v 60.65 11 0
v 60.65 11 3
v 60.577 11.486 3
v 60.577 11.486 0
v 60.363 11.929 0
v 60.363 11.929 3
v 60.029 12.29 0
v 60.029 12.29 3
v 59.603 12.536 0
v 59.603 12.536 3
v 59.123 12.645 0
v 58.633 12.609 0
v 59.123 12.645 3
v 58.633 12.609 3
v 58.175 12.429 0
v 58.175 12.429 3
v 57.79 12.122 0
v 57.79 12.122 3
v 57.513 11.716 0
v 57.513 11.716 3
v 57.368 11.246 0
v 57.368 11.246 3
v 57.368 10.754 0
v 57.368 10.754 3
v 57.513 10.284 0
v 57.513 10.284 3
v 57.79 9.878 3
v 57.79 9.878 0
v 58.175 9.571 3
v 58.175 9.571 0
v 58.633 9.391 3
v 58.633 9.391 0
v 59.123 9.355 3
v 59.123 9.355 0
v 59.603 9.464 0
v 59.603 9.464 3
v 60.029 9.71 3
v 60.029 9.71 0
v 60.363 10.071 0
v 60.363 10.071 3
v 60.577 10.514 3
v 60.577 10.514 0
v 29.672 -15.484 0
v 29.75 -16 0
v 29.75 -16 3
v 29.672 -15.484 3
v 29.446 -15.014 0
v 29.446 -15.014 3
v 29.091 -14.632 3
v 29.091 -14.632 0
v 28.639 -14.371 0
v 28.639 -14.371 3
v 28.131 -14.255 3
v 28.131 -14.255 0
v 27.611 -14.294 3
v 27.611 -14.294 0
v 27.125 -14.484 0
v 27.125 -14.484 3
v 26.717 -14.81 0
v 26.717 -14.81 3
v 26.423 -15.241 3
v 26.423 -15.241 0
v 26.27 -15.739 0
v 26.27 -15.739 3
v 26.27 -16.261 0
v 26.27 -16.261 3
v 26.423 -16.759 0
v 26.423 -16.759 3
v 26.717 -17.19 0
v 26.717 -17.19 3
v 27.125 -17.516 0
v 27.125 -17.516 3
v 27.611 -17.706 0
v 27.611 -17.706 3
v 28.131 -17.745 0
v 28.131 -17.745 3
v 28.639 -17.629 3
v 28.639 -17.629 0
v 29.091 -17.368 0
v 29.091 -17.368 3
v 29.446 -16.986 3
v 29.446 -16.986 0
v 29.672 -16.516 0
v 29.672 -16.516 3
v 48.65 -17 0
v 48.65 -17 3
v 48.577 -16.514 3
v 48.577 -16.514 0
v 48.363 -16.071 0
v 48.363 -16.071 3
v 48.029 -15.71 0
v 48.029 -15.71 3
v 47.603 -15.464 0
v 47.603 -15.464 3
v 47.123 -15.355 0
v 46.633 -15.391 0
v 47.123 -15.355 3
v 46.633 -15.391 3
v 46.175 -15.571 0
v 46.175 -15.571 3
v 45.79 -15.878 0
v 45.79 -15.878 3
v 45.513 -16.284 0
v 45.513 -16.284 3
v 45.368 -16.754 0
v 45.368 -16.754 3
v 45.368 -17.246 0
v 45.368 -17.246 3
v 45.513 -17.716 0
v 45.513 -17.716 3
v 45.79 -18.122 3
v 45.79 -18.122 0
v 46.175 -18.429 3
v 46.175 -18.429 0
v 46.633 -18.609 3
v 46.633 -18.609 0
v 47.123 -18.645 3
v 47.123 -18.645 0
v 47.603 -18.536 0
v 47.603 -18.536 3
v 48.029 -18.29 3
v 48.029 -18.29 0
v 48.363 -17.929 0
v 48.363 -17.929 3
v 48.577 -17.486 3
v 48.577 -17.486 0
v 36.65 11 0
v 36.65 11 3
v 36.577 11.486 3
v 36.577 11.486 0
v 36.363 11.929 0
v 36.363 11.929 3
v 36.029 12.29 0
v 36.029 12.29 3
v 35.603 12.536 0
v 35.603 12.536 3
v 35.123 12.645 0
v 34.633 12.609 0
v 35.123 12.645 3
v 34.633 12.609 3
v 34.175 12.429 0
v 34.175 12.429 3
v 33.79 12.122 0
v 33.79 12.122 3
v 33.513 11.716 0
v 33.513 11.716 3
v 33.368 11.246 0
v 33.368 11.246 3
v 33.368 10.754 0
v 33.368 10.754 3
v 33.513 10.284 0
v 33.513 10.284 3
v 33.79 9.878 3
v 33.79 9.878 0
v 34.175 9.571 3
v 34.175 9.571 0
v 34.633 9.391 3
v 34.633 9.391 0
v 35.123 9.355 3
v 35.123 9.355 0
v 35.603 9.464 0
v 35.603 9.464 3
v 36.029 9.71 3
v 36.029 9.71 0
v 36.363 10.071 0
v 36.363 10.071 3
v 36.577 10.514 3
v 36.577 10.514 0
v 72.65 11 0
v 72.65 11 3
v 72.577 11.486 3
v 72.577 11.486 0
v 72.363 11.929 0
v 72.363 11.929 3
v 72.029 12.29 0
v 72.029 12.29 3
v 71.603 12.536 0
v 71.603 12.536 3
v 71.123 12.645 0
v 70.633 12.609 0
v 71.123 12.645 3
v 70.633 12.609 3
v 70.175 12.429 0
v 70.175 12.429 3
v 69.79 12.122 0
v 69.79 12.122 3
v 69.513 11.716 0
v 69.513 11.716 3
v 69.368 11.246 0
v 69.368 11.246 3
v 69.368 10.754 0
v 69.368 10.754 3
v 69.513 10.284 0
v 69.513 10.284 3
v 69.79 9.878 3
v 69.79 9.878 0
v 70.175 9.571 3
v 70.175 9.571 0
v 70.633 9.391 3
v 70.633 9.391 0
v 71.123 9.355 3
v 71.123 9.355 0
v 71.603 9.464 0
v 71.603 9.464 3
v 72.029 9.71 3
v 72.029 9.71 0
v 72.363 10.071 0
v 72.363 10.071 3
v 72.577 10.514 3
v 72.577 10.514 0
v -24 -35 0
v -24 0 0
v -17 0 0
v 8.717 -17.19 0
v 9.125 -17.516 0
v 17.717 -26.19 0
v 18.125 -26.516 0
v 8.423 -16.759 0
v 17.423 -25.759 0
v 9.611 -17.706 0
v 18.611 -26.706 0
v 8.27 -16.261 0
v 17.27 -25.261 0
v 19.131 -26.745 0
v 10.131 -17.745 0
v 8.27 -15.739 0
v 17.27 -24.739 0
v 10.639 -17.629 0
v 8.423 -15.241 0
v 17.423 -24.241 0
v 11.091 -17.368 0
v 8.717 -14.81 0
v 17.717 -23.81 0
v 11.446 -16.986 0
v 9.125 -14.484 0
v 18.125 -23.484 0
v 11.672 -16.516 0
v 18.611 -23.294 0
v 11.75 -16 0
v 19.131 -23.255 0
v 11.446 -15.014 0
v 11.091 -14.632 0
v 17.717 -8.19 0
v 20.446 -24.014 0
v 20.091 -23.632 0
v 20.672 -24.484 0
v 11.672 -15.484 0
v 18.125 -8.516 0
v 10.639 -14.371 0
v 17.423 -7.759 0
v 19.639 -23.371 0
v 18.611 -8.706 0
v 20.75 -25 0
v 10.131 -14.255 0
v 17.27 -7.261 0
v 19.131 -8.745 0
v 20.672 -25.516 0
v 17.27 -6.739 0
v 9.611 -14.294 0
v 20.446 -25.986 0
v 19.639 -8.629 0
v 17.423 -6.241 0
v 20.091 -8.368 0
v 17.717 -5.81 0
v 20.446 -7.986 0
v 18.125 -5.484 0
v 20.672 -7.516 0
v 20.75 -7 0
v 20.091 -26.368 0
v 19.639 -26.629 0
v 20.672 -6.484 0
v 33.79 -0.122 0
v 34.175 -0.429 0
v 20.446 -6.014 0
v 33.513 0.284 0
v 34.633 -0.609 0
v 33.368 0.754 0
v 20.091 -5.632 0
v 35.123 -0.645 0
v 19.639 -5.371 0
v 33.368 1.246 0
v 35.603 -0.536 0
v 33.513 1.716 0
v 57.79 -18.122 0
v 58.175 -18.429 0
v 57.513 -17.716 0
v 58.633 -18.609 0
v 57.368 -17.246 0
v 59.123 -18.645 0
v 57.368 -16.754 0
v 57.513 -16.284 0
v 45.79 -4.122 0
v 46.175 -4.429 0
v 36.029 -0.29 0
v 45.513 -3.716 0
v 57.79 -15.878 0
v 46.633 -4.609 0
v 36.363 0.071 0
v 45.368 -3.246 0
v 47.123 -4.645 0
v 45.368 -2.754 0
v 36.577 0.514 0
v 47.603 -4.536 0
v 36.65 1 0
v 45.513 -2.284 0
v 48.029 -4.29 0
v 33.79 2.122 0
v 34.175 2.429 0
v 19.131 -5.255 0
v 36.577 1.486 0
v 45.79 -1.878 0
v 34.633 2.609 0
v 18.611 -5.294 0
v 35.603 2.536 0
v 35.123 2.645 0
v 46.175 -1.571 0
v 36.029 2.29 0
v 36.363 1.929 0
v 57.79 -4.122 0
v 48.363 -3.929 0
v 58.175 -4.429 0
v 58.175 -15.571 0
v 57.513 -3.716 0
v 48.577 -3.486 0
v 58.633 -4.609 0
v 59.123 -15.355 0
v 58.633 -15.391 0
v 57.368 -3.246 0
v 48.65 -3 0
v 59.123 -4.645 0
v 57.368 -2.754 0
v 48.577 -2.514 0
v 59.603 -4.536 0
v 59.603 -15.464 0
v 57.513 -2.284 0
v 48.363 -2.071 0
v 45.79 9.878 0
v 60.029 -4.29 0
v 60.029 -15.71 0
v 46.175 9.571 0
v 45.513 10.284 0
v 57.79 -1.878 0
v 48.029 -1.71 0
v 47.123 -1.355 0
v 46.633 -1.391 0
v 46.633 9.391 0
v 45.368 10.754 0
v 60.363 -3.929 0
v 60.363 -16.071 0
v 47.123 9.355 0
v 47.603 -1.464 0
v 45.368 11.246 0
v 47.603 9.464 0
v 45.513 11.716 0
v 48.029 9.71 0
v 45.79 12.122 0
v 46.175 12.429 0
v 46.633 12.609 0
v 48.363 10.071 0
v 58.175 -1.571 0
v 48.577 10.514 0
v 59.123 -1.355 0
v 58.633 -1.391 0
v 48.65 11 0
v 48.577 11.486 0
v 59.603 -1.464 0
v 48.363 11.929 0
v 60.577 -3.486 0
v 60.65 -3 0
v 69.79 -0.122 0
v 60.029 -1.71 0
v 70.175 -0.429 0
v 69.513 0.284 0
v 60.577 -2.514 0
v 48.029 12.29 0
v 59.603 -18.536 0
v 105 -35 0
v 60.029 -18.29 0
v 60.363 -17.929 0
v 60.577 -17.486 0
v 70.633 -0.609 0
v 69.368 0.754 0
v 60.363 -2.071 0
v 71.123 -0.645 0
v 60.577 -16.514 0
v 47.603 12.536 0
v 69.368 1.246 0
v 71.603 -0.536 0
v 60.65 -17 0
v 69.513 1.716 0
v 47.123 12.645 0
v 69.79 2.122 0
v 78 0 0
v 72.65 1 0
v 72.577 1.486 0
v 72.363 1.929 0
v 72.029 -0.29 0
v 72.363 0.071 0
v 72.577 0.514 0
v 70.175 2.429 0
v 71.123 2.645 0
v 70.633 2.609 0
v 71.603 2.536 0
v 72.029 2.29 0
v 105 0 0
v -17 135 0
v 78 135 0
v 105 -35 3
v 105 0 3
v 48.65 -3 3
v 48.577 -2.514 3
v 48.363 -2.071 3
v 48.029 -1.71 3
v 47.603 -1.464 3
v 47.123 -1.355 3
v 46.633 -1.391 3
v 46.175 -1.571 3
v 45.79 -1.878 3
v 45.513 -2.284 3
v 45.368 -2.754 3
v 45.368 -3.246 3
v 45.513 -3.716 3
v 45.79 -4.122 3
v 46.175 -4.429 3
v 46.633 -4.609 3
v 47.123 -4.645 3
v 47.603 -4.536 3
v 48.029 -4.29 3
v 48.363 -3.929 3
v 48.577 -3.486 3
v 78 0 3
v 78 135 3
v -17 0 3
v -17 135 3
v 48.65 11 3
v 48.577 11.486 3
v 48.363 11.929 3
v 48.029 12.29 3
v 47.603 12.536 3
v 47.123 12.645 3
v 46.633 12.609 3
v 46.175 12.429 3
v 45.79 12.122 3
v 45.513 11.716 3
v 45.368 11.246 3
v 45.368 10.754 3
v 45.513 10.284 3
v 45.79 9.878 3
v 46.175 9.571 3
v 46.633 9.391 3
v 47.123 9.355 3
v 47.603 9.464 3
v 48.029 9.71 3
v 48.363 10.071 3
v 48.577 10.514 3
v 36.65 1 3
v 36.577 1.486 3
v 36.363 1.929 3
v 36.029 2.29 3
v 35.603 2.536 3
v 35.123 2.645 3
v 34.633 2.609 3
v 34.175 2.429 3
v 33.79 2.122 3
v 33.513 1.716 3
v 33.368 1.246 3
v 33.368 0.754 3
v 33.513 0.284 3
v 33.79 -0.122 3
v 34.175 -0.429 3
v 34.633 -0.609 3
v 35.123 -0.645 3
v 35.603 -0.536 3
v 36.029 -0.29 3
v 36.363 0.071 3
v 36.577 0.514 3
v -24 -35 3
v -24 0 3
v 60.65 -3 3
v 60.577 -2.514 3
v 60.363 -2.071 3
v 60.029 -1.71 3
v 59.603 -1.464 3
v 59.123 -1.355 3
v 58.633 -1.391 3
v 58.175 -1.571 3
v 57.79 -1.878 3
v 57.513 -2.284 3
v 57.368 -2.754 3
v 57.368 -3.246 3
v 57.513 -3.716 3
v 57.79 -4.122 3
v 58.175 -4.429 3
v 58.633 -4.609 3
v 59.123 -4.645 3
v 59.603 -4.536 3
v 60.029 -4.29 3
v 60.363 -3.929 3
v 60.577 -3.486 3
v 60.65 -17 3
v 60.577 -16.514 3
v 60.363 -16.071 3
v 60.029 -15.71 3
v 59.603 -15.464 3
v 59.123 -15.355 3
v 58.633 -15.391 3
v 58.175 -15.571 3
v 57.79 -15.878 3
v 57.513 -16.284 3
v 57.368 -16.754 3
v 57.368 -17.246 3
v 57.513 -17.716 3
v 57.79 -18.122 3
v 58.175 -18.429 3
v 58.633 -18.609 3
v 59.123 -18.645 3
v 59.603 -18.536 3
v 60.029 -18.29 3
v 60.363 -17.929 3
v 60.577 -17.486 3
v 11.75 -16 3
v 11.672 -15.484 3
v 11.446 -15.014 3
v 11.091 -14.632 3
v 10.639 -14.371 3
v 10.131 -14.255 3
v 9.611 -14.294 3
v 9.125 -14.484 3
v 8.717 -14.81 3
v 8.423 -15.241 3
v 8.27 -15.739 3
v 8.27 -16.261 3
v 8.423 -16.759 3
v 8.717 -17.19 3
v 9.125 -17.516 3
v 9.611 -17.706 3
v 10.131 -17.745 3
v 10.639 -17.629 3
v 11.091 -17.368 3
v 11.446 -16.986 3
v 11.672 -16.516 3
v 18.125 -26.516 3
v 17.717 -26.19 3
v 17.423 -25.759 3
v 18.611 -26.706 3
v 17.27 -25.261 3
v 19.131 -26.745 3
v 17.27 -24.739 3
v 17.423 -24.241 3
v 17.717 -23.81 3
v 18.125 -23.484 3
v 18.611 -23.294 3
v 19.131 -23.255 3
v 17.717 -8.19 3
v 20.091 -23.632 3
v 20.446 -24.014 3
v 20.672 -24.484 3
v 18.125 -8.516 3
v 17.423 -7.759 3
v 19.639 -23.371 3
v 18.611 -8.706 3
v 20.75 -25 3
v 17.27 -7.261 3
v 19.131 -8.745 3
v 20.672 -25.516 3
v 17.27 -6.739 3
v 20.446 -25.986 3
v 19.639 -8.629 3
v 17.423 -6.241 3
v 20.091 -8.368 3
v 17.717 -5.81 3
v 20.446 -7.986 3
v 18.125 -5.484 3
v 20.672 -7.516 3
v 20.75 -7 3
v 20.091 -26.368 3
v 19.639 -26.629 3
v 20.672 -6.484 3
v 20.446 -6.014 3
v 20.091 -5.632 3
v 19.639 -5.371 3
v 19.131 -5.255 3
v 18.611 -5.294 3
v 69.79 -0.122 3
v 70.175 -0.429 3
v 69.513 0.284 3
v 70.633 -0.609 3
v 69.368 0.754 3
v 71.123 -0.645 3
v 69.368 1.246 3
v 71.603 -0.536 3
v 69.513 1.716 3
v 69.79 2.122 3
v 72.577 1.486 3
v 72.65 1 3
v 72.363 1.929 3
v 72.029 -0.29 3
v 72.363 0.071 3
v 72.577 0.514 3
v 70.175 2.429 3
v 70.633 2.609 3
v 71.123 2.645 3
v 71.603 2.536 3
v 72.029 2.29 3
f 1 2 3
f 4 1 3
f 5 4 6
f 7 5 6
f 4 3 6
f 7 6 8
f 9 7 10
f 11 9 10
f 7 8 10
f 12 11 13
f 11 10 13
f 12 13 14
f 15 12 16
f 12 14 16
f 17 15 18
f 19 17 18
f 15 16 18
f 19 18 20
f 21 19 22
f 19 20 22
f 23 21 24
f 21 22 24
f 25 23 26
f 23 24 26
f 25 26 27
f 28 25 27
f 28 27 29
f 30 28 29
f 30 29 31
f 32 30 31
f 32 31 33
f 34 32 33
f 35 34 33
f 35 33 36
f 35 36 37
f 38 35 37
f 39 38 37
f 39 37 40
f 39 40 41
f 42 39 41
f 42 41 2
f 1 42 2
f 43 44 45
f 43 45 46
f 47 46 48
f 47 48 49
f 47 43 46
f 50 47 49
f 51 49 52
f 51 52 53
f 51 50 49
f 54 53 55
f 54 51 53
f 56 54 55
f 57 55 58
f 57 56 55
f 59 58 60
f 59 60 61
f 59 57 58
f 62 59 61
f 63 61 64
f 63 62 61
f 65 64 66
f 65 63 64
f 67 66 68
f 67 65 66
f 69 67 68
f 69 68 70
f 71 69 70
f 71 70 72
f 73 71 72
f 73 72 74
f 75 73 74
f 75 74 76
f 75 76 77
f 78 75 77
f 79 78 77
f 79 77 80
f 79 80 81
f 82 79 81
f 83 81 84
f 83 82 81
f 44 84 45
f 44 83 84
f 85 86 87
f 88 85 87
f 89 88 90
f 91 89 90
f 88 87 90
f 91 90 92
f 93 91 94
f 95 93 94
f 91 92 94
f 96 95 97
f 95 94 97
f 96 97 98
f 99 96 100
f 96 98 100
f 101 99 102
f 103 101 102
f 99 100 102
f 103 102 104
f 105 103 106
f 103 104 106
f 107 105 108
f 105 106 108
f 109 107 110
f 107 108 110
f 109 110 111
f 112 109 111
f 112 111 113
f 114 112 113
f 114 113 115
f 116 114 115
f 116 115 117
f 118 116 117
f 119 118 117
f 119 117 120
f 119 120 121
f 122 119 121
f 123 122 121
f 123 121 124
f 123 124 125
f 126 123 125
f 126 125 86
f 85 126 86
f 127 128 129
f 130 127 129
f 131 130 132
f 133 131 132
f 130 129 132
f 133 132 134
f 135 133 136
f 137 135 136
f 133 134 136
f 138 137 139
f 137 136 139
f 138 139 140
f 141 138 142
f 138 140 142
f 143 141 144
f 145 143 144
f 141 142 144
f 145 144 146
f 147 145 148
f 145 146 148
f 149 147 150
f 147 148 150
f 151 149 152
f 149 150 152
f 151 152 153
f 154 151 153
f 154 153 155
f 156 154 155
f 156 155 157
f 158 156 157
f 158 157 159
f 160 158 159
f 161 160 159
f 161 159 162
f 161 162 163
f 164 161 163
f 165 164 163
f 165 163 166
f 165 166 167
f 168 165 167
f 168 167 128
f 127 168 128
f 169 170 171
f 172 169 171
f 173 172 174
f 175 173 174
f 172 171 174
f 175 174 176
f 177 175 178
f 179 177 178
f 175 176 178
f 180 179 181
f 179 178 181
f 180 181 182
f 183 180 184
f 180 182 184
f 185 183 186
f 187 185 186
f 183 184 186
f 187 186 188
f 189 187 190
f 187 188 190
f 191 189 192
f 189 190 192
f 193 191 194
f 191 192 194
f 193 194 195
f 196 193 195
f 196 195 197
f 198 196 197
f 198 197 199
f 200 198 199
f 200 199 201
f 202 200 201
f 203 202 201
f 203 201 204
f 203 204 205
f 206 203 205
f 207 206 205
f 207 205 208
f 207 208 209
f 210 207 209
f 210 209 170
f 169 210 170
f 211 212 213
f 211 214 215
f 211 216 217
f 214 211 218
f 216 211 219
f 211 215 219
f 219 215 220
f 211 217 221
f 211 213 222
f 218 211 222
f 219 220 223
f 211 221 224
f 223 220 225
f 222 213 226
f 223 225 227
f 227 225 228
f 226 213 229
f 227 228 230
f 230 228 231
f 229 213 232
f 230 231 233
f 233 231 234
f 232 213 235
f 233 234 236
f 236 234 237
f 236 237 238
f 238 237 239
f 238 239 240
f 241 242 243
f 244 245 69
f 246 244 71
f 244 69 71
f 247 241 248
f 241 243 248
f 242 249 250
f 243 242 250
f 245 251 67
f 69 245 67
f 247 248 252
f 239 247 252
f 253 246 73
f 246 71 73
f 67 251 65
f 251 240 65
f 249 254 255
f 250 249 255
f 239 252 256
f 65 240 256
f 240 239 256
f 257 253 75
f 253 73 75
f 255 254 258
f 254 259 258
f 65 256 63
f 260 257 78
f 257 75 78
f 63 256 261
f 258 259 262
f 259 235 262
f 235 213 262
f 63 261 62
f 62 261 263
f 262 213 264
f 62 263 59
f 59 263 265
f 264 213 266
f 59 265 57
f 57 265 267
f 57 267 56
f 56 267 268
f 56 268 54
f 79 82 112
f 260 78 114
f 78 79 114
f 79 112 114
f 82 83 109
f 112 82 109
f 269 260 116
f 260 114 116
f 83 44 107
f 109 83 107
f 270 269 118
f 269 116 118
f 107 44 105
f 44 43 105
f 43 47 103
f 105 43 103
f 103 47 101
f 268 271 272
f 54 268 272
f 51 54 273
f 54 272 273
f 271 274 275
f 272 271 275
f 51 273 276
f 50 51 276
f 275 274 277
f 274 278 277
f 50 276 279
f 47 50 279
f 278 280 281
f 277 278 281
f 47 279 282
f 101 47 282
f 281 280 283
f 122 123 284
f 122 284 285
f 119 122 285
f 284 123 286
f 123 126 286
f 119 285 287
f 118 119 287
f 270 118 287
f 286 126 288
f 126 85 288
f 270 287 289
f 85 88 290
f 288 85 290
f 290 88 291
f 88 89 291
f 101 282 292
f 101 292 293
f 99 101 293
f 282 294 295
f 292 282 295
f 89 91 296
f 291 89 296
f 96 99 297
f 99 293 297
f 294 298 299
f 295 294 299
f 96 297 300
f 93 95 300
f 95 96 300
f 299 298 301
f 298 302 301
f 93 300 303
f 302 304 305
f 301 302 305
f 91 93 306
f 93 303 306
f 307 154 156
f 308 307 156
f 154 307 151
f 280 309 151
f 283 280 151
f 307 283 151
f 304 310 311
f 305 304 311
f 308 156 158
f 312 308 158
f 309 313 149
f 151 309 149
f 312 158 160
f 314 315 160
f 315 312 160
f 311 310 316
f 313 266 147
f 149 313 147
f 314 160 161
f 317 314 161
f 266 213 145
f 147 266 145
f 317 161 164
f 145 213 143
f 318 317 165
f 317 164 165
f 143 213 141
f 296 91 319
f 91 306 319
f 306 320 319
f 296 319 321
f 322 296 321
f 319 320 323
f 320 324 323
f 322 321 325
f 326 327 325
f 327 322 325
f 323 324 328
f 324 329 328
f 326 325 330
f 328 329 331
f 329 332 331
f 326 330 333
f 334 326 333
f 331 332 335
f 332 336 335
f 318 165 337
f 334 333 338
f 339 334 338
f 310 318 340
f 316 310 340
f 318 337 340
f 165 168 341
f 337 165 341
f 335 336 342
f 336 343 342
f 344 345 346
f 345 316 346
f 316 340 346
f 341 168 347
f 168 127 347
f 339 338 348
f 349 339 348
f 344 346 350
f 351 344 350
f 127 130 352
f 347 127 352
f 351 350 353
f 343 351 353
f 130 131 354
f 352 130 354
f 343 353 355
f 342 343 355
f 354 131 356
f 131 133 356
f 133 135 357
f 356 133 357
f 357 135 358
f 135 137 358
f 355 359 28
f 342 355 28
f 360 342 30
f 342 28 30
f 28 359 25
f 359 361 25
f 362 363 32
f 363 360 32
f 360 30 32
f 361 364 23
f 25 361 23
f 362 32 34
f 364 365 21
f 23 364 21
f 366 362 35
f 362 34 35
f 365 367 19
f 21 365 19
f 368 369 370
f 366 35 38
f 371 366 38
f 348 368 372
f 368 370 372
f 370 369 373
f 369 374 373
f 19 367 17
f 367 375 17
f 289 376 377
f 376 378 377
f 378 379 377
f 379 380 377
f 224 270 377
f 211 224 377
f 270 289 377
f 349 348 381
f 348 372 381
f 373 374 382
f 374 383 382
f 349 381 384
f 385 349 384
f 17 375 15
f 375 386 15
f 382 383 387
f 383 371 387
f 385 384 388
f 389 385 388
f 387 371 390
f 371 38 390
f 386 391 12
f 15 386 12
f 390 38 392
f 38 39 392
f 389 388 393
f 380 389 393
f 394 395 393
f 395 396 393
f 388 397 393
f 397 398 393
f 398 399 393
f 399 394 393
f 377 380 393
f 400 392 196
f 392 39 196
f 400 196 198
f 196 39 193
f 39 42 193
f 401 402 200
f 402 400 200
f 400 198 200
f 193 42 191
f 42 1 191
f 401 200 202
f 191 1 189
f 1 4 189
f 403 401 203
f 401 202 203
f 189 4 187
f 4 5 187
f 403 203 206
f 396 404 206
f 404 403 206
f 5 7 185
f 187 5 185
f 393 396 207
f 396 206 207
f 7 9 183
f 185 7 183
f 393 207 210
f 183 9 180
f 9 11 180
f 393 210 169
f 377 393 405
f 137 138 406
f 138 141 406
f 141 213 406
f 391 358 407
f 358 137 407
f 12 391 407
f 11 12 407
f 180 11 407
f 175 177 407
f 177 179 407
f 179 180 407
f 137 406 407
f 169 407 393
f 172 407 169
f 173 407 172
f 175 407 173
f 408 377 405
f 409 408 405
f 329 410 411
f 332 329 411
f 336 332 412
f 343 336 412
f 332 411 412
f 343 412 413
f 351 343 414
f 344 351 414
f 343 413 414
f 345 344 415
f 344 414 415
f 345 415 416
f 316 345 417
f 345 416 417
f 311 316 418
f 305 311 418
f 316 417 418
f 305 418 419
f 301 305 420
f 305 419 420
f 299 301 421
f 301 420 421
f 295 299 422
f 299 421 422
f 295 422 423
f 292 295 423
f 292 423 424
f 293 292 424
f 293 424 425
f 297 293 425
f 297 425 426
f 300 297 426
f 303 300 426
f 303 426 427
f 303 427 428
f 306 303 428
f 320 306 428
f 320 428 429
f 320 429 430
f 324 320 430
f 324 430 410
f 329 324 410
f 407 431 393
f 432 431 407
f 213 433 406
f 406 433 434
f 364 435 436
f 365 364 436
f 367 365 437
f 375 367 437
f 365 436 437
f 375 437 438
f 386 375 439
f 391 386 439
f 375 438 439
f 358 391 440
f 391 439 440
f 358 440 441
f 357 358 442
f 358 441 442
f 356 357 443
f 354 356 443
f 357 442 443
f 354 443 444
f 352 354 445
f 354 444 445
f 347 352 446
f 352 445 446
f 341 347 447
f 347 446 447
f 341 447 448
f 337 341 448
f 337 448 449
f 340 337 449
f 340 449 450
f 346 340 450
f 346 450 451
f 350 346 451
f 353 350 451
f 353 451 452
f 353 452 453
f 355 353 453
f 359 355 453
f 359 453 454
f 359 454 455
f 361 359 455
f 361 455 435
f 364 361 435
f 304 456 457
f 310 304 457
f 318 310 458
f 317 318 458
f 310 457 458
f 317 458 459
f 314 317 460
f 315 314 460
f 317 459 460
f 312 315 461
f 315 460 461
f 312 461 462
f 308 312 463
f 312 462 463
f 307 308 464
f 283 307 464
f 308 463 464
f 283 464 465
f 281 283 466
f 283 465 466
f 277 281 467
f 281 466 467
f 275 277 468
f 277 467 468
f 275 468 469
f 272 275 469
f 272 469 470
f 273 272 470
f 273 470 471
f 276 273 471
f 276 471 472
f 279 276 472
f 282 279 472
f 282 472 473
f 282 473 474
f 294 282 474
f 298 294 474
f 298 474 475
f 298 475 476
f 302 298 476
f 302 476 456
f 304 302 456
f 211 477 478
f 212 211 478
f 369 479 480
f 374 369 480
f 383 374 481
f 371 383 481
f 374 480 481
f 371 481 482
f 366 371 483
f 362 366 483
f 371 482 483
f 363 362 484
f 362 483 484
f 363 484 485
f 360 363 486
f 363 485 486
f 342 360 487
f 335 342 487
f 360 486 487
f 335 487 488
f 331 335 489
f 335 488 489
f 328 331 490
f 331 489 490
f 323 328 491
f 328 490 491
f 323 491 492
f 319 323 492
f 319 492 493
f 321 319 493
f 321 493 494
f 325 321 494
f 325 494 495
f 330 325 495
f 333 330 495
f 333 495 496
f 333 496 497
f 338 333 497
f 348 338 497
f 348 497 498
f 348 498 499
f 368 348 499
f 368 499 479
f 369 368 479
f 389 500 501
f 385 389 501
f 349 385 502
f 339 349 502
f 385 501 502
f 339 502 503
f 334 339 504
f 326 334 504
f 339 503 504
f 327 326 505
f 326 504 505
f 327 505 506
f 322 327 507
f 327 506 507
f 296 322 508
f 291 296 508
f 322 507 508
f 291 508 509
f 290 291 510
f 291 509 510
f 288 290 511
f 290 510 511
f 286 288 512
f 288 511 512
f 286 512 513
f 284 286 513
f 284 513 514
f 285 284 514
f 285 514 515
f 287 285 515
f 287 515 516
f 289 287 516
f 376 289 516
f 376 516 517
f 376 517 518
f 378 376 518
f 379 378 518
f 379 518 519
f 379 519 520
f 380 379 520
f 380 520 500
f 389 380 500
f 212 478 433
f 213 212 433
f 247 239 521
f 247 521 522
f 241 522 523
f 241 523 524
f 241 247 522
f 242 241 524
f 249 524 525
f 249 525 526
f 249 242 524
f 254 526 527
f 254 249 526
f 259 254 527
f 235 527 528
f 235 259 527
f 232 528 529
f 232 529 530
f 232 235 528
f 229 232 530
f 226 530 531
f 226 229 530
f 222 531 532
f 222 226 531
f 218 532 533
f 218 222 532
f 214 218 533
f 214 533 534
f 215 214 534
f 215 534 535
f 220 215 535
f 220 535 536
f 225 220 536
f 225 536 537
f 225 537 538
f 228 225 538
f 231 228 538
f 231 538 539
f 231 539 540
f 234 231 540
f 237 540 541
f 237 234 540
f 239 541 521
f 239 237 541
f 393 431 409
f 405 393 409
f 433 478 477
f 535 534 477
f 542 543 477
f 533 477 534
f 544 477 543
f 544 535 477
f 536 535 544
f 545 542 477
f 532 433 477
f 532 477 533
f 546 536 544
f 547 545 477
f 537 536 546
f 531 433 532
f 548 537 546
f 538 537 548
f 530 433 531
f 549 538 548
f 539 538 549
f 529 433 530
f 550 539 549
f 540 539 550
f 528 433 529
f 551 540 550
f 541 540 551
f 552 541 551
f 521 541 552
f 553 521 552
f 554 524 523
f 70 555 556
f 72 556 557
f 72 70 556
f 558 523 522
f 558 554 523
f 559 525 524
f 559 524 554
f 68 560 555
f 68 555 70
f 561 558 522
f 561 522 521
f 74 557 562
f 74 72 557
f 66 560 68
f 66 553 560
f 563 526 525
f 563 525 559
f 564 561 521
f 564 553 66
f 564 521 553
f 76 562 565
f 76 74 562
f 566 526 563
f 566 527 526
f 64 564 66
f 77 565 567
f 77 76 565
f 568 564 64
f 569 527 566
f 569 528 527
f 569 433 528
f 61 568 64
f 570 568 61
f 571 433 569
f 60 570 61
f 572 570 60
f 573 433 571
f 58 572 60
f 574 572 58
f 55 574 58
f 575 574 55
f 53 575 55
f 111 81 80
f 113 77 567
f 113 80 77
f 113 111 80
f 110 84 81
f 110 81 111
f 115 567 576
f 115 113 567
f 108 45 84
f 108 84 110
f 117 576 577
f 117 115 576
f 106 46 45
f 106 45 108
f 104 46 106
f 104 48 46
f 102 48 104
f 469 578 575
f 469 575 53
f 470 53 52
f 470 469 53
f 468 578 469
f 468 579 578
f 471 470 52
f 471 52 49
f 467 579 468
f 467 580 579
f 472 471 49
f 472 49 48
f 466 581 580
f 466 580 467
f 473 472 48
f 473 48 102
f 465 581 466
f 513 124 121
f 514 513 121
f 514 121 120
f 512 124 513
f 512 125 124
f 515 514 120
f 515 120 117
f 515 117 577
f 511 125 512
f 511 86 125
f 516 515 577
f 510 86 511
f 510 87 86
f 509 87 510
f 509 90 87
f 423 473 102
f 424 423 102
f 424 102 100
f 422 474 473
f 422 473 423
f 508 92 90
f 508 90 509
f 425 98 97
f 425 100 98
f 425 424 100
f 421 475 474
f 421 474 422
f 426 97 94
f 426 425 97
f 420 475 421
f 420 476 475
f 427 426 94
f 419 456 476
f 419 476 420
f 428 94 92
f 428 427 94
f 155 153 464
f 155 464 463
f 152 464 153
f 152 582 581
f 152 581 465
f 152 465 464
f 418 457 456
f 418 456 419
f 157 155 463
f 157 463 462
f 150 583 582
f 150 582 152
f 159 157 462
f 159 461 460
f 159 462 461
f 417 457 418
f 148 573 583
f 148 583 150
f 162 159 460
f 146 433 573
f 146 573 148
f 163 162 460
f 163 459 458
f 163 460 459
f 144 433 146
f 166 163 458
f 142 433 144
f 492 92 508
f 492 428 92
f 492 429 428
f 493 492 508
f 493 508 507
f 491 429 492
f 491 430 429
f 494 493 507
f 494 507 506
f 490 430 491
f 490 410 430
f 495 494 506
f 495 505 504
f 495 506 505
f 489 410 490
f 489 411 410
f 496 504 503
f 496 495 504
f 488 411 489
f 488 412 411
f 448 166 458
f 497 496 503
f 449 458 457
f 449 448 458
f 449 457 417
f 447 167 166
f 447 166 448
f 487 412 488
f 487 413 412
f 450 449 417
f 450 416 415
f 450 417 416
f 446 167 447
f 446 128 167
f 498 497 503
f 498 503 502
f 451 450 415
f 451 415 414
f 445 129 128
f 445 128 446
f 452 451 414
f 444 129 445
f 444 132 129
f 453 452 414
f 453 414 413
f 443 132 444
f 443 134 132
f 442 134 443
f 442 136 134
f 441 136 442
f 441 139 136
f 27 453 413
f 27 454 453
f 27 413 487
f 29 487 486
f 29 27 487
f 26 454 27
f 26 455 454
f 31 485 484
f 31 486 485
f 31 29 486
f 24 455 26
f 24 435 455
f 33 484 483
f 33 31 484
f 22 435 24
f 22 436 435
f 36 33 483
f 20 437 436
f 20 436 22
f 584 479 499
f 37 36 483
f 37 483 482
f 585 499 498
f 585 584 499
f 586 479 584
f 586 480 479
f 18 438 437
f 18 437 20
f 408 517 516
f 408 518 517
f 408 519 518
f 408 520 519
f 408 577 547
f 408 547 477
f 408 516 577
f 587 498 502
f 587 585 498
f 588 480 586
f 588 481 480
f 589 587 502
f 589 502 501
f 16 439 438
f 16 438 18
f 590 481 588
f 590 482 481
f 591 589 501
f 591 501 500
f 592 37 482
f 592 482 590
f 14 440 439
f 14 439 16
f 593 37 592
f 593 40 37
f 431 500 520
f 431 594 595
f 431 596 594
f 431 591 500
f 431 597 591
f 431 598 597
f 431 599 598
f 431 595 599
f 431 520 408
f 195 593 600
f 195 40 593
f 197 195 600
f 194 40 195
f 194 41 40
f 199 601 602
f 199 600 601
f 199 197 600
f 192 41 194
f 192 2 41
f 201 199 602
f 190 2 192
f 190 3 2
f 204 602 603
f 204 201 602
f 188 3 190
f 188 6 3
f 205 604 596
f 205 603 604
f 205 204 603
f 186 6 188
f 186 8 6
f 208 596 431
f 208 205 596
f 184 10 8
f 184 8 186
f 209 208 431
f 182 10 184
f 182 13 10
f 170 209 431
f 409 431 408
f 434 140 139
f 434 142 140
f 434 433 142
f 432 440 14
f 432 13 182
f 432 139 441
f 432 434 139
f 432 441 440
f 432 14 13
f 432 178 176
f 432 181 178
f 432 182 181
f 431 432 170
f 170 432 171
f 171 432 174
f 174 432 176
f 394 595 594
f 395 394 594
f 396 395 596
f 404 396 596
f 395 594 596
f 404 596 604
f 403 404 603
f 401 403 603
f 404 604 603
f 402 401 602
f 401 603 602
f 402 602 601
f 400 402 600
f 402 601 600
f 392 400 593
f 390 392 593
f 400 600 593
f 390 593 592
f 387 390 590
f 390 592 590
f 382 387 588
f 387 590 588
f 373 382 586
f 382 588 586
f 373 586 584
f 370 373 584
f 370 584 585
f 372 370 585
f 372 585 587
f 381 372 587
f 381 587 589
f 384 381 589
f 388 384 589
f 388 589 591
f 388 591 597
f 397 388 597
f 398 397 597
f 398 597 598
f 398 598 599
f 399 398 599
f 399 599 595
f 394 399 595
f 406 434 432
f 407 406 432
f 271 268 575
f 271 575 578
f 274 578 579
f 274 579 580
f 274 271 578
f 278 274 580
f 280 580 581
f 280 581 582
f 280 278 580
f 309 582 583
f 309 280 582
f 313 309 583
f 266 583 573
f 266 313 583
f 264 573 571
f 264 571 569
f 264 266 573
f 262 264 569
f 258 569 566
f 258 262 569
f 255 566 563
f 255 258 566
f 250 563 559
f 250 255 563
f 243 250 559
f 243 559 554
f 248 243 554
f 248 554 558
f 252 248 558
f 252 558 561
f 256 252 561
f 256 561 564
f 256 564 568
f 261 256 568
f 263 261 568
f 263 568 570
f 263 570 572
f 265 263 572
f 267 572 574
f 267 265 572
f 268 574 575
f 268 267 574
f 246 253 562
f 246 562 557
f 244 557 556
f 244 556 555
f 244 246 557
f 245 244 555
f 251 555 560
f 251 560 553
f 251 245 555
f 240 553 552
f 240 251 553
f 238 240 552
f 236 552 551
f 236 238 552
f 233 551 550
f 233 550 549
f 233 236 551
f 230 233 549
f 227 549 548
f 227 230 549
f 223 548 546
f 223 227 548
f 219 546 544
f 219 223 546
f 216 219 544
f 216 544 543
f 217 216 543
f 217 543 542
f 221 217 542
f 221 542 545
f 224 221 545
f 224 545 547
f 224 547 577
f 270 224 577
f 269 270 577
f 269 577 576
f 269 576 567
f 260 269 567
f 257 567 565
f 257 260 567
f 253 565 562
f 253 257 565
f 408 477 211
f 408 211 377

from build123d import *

# Parameters (mm, degrees)
SKETCH_1_W          = 105
SKETCH_1_H          = 35
SKETCH_1_R          = 1.75
EXTRUDE_1_DEPTH     = 3
SKETCH_3_W          = 24
SKETCH_3_H          = 35
EXTRUDE_2_DEPTH     = 3
SKETCH_4_W          = 95
SKETCH_4_H          = 135
EXTRUDE_3_DEPTH     = 3
SKETCH_2_R          = 1.65
CUT_EXTRUDE_1_DEPTH = 172.052623482


with BuildPart() as part:
    # 草图1 → 凸台-拉伸1 (new body)
    with BuildSketch(Plane.XY):
        with Locations((52.5, -17.5)):
            Rectangle(SKETCH_1_W, SKETCH_1_H)
        with Locations((19, -7)):
            Circle(SKETCH_1_R, mode=Mode.SUBTRACT)
        with Locations((10, -16)):
            Circle(SKETCH_1_R, mode=Mode.SUBTRACT)
        with Locations((19, -25)):
            Circle(SKETCH_1_R, mode=Mode.SUBTRACT)
        with Locations((28, -16)):
            Circle(SKETCH_1_R, mode=Mode.SUBTRACT)
    extrude(amount=EXTRUDE_1_DEPTH)

    # 草图3 → 凸台-拉伸2 (add)
    with BuildSketch(Plane.XY.offset(3)):
        with Locations((-12, -17.5)):
            Rectangle(SKETCH_3_W, SKETCH_3_H)
    extrude(amount=-EXTRUDE_2_DEPTH)

    # 草图4 → 凸台-拉伸3 (add)
    with BuildSketch(Plane.XY.offset(3)):
        with Locations((30.5, 67.5)):
            Rectangle(SKETCH_4_W, SKETCH_4_H)
    extrude(amount=-EXTRUDE_3_DEPTH)

    # 草图2 → 切除-拉伸1 (cut, through all)
    with BuildSketch(Plane.XY.offset(3)):
        with Locations((47, -3)):
            Circle(SKETCH_2_R)
        with Locations((59, -3)):
            Circle(SKETCH_2_R)
        with Locations((47, 11)):
            Circle(SKETCH_2_R)
        with Locations((59, 11)):
            Circle(SKETCH_2_R)
        with Locations((71, 11)):
            Circle(SKETCH_2_R)
        with Locations((35, 11)):
            Circle(SKETCH_2_R)
        with Locations((35, 1)):
            Circle(SKETCH_2_R)
        with Locations((71, 1)):
            Circle(SKETCH_2_R)
        with Locations((47, -17)):
            Circle(SKETCH_2_R)
        with Locations((59, -17)):
            Circle(SKETCH_2_R)
    extrude(amount=-CUT_EXTRUDE_1_DEPTH, mode=Mode.SUBTRACT)


solid = part.part
